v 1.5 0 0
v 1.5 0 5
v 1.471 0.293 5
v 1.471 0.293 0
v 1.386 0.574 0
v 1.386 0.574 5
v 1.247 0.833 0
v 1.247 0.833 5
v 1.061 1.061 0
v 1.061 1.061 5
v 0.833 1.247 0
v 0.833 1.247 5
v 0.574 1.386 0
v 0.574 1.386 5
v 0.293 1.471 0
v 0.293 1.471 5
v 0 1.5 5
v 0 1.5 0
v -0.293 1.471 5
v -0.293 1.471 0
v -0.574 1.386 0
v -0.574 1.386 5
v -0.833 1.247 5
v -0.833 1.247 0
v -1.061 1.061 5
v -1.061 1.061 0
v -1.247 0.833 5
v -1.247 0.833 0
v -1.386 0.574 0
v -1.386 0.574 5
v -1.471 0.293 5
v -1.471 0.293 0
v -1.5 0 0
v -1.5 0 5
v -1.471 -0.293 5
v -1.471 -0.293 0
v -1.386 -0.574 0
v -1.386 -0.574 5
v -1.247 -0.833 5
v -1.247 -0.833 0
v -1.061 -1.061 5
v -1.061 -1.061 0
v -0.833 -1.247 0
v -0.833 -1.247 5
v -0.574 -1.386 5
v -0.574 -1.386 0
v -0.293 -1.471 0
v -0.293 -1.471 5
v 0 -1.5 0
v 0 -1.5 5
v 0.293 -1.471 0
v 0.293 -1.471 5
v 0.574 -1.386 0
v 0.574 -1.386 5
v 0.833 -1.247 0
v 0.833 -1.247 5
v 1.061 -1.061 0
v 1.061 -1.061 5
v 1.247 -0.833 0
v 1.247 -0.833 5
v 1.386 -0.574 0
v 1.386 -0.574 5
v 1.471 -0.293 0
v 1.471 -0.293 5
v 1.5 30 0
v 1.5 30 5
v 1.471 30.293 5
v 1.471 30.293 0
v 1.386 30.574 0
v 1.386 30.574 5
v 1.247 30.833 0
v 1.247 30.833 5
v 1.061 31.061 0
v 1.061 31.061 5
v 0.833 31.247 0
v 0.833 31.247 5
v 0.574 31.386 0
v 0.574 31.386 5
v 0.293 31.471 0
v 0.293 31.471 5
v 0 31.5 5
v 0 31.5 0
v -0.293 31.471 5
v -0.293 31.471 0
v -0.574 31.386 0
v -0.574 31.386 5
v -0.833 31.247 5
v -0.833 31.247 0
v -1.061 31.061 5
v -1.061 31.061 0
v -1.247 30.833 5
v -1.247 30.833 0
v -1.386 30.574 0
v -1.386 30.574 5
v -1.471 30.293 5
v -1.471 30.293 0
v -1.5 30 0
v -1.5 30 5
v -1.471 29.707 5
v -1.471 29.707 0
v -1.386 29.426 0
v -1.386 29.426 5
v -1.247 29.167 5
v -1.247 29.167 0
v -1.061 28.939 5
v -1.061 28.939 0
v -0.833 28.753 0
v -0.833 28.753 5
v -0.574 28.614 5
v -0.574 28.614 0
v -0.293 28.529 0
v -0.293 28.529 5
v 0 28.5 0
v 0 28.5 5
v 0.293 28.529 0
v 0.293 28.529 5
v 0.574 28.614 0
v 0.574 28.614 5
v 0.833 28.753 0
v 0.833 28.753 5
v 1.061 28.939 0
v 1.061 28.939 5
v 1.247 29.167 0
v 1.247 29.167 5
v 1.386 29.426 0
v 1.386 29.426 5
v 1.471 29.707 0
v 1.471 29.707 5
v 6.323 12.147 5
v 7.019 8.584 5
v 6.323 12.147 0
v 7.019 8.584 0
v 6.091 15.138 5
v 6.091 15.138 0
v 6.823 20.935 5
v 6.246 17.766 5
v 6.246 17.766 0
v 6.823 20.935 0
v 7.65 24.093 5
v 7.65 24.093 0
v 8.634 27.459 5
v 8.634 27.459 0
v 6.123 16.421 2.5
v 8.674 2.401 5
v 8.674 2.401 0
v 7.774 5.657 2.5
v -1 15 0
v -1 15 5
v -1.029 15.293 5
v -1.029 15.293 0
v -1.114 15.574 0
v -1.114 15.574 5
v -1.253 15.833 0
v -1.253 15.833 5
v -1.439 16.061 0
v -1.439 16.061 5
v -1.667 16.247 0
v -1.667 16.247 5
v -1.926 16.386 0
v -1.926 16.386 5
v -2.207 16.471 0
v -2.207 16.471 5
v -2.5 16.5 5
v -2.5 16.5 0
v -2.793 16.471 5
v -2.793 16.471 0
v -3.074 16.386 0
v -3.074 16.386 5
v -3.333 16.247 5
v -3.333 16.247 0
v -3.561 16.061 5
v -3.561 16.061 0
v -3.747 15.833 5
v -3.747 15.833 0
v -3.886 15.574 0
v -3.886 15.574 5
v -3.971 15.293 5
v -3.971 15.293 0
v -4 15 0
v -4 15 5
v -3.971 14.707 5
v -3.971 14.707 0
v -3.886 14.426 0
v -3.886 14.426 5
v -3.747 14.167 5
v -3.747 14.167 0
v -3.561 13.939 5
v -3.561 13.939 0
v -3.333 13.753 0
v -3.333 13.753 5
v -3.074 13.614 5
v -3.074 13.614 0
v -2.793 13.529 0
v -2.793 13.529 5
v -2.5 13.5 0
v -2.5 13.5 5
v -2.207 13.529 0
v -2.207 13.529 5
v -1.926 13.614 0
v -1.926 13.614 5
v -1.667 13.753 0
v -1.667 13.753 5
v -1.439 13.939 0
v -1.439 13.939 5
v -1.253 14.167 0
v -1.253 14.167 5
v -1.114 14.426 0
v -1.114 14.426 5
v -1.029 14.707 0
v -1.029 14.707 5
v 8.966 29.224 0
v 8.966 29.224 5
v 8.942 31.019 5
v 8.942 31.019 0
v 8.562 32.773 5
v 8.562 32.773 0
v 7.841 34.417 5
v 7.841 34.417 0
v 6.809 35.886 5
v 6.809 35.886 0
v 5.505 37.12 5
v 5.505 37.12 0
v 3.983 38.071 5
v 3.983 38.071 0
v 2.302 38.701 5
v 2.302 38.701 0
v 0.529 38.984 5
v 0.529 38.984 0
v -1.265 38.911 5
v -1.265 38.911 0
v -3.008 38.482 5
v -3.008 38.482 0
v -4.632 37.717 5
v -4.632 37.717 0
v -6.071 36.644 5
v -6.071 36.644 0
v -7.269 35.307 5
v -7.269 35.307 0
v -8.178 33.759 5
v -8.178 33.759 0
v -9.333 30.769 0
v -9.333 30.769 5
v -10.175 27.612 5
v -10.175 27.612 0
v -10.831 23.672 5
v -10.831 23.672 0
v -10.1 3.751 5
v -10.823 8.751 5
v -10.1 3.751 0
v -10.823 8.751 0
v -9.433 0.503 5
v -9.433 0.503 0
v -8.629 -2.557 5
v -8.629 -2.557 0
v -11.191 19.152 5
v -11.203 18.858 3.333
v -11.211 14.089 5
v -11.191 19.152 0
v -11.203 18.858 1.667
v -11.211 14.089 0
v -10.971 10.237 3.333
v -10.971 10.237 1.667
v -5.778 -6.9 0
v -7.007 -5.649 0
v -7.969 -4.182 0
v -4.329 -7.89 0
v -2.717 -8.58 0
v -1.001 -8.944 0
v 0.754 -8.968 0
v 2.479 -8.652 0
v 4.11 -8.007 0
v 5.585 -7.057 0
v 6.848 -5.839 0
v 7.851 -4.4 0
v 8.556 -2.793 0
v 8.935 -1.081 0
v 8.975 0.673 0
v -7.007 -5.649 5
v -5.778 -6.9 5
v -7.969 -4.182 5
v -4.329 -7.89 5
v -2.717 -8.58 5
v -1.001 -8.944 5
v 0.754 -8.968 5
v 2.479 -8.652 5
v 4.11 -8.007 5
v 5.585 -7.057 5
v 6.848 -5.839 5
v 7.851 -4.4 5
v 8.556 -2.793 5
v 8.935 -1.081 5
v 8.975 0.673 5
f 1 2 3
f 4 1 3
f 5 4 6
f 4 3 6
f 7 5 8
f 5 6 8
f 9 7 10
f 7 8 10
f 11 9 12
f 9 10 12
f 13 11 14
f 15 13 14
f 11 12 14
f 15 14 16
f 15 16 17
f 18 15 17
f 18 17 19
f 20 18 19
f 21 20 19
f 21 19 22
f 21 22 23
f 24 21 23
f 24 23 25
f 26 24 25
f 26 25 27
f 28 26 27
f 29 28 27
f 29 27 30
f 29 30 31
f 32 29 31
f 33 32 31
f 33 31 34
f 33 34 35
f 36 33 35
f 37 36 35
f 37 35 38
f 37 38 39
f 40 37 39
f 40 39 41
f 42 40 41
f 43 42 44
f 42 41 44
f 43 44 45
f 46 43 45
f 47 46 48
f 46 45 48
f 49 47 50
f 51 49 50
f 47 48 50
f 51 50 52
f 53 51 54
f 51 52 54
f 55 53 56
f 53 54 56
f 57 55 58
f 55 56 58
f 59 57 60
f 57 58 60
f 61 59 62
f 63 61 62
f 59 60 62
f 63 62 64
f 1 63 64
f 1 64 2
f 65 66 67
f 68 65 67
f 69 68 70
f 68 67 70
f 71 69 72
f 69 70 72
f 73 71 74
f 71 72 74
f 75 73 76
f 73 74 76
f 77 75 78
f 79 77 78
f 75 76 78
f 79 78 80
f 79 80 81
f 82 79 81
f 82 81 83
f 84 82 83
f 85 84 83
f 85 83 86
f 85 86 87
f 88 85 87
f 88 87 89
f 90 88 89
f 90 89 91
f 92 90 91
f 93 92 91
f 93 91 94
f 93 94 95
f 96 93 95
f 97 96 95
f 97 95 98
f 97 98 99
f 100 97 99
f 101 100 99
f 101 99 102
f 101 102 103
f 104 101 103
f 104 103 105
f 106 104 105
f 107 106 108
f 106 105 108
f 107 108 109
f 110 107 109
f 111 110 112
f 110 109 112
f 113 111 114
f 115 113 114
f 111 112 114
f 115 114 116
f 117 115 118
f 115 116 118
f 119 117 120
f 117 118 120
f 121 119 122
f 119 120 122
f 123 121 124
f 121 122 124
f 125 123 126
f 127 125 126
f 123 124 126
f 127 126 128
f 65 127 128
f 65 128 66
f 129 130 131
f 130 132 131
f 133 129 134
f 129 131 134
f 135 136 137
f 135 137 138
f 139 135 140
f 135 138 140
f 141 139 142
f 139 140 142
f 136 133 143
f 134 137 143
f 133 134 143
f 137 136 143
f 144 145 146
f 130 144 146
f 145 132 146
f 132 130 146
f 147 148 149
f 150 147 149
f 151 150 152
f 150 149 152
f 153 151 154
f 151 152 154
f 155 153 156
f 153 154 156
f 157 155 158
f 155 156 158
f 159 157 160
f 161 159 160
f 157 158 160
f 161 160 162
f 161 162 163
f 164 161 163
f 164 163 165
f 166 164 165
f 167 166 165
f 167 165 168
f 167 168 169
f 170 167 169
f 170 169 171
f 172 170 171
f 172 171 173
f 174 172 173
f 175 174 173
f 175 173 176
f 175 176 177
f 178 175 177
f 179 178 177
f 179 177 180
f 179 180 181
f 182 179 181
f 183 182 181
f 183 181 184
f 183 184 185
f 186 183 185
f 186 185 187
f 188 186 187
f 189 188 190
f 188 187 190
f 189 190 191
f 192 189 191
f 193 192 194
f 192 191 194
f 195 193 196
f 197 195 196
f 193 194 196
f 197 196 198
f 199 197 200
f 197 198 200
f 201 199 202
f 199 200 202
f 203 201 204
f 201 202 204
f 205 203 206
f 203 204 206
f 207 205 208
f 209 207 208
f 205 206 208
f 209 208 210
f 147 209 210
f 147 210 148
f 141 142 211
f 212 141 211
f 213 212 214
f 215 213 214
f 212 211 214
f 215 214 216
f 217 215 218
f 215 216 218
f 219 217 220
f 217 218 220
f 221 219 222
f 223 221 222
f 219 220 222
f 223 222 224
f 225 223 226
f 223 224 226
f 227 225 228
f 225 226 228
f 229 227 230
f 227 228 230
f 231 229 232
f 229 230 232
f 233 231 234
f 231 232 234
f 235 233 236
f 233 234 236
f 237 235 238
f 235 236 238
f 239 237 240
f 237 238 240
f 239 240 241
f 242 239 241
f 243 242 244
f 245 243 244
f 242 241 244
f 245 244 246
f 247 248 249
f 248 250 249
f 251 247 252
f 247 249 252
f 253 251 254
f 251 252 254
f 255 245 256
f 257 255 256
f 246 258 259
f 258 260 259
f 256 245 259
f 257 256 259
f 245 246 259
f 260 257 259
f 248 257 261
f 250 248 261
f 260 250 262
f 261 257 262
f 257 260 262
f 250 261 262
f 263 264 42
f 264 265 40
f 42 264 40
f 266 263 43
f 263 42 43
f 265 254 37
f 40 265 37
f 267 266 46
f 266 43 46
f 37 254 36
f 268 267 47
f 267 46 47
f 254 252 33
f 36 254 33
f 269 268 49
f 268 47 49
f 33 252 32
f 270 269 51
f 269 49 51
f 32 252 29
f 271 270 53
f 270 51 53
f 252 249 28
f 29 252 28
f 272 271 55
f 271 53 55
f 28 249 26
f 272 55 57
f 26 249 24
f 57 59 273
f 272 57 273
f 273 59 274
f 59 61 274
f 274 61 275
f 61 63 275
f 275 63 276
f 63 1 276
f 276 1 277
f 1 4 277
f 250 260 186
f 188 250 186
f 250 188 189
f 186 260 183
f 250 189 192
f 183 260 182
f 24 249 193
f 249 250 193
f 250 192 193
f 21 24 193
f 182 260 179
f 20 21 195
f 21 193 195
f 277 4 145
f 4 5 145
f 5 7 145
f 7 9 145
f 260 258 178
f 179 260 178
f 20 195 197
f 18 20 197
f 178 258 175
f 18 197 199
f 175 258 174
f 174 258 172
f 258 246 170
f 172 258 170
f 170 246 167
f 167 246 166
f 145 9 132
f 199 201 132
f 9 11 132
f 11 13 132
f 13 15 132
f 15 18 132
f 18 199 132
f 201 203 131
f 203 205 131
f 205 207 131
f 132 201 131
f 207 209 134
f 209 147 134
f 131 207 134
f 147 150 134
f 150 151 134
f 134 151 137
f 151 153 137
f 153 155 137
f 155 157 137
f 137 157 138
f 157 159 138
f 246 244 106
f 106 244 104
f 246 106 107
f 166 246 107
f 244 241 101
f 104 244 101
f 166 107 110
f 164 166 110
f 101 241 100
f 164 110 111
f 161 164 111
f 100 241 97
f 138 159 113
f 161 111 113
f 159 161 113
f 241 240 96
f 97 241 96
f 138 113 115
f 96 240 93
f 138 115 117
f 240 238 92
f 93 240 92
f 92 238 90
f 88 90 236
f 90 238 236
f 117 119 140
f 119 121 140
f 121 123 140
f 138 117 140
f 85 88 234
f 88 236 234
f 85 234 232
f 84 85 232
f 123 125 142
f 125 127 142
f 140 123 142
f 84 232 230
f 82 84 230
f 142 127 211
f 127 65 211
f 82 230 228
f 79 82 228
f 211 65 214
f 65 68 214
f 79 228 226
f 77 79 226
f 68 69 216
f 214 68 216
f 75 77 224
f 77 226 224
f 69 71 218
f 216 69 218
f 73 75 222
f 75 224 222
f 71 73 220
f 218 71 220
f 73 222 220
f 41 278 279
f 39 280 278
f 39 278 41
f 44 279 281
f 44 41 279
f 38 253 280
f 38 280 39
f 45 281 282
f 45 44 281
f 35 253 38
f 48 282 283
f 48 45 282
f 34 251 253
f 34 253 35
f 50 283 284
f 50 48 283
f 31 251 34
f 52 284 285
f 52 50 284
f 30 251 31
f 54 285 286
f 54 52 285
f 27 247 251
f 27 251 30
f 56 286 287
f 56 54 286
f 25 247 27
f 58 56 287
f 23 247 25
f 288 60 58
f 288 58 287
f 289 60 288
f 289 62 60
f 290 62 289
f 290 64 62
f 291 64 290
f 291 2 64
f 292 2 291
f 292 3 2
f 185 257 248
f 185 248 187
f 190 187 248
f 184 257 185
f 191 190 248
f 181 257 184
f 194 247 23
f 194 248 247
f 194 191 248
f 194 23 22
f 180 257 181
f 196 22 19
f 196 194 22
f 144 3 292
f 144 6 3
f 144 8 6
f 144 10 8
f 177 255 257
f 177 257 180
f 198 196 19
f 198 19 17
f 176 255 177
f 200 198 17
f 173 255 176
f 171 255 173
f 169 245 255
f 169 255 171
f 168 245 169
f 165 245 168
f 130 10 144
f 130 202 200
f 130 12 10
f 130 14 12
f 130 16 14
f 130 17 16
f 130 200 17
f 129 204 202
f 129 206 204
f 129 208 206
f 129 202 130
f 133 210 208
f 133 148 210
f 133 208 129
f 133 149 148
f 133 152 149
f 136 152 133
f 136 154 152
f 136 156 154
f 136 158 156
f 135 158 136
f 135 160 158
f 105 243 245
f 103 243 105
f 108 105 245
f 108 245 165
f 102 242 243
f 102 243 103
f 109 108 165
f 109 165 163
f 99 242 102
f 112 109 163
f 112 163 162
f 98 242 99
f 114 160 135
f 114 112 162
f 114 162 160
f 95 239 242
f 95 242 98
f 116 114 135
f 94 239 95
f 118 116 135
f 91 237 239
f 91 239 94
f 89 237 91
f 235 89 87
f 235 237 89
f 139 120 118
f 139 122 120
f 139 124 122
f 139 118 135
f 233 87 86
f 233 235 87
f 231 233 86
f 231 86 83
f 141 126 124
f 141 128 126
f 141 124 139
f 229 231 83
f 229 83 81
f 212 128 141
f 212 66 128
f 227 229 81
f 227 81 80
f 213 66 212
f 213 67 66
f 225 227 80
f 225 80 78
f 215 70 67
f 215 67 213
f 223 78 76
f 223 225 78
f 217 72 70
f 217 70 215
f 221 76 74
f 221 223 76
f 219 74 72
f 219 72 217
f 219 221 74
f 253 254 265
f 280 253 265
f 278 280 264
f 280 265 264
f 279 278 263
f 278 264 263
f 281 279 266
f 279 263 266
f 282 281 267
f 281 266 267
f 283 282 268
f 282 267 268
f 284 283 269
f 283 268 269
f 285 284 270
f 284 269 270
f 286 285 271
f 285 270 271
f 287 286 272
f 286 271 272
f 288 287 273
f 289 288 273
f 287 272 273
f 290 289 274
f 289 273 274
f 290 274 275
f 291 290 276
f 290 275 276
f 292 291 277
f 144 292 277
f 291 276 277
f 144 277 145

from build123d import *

# Parameters (mm, degrees)
SKETCH_1_R          = 9
EXTRUDE_1_DEPTH     = 5
SKETCH_2_R          = 1.5
CUT_EXTRUDE_1_DEPTH = 10
SKETCH_3_R          = 1.5
CUT_EXTRUDE_2_DEPTH = 10


with BuildPart() as part:
    # 草图1 → 凸台-拉伸1 (new body)
    with BuildSketch(Plane.XY):
        with BuildLine():
            ThreePointArc((-8.629267244, -2.556510674), (-2.479070596, 8.651832695), (8.673703204, 2.401431392))
            add(Edge.make_bspline(
                [(8.673703204, 2.401431392), (7.075929143, 8.172413663), (4.921999012, 15.324710847), (7.430404247, 23.369076832), (8.633989736, 27.459484061)],
                knots=[0, 0, 0, 0, 0.557287964, 1, 1, 1, 1], degree=3))
            ThreePointArc((8.633989736, 27.459484061), (-3.157797251, 21.572170118), (-8.17760204, 33.758566865))
            add(Edge.make_bspline(
                [(-8.17760204, 33.758566865), (-10.239121011, 29.273271712), (-11.449987144, 20.943264961), (-11.113666199, 8.883330205), (-9.769292032, 1.291538409), (-8.629267244, -2.556510674)],
                knots=[0, 0, 0, 0, 0.412769953, 0.64691545, 1, 1, 1, 1], degree=3))
        make_face()
        with Locations((0, 30)):
            Circle(SKETCH_1_R)
        Circle(SKETCH_1_R)
    extrude(amount=EXTRUDE_1_DEPTH)

    # 草图2 → 切除-拉伸1 (cut)
    with BuildSketch(Plane.XY.offset(5)):
        with Locations((0, 30)):
            Circle(SKETCH_2_R)
        Circle(SKETCH_2_R)
    extrude(amount=-CUT_EXTRUDE_1_DEPTH, mode=Mode.SUBTRACT)

    # 草图3 → 切除-拉伸2 (cut)
    with BuildSketch(Plane.XY.offset(5)):
        with Locations((-2.5, 15)):
            Circle(SKETCH_3_R)
    extrude(amount=-CUT_EXTRUDE_2_DEPTH, mode=Mode.SUBTRACT)


solid = part.part
